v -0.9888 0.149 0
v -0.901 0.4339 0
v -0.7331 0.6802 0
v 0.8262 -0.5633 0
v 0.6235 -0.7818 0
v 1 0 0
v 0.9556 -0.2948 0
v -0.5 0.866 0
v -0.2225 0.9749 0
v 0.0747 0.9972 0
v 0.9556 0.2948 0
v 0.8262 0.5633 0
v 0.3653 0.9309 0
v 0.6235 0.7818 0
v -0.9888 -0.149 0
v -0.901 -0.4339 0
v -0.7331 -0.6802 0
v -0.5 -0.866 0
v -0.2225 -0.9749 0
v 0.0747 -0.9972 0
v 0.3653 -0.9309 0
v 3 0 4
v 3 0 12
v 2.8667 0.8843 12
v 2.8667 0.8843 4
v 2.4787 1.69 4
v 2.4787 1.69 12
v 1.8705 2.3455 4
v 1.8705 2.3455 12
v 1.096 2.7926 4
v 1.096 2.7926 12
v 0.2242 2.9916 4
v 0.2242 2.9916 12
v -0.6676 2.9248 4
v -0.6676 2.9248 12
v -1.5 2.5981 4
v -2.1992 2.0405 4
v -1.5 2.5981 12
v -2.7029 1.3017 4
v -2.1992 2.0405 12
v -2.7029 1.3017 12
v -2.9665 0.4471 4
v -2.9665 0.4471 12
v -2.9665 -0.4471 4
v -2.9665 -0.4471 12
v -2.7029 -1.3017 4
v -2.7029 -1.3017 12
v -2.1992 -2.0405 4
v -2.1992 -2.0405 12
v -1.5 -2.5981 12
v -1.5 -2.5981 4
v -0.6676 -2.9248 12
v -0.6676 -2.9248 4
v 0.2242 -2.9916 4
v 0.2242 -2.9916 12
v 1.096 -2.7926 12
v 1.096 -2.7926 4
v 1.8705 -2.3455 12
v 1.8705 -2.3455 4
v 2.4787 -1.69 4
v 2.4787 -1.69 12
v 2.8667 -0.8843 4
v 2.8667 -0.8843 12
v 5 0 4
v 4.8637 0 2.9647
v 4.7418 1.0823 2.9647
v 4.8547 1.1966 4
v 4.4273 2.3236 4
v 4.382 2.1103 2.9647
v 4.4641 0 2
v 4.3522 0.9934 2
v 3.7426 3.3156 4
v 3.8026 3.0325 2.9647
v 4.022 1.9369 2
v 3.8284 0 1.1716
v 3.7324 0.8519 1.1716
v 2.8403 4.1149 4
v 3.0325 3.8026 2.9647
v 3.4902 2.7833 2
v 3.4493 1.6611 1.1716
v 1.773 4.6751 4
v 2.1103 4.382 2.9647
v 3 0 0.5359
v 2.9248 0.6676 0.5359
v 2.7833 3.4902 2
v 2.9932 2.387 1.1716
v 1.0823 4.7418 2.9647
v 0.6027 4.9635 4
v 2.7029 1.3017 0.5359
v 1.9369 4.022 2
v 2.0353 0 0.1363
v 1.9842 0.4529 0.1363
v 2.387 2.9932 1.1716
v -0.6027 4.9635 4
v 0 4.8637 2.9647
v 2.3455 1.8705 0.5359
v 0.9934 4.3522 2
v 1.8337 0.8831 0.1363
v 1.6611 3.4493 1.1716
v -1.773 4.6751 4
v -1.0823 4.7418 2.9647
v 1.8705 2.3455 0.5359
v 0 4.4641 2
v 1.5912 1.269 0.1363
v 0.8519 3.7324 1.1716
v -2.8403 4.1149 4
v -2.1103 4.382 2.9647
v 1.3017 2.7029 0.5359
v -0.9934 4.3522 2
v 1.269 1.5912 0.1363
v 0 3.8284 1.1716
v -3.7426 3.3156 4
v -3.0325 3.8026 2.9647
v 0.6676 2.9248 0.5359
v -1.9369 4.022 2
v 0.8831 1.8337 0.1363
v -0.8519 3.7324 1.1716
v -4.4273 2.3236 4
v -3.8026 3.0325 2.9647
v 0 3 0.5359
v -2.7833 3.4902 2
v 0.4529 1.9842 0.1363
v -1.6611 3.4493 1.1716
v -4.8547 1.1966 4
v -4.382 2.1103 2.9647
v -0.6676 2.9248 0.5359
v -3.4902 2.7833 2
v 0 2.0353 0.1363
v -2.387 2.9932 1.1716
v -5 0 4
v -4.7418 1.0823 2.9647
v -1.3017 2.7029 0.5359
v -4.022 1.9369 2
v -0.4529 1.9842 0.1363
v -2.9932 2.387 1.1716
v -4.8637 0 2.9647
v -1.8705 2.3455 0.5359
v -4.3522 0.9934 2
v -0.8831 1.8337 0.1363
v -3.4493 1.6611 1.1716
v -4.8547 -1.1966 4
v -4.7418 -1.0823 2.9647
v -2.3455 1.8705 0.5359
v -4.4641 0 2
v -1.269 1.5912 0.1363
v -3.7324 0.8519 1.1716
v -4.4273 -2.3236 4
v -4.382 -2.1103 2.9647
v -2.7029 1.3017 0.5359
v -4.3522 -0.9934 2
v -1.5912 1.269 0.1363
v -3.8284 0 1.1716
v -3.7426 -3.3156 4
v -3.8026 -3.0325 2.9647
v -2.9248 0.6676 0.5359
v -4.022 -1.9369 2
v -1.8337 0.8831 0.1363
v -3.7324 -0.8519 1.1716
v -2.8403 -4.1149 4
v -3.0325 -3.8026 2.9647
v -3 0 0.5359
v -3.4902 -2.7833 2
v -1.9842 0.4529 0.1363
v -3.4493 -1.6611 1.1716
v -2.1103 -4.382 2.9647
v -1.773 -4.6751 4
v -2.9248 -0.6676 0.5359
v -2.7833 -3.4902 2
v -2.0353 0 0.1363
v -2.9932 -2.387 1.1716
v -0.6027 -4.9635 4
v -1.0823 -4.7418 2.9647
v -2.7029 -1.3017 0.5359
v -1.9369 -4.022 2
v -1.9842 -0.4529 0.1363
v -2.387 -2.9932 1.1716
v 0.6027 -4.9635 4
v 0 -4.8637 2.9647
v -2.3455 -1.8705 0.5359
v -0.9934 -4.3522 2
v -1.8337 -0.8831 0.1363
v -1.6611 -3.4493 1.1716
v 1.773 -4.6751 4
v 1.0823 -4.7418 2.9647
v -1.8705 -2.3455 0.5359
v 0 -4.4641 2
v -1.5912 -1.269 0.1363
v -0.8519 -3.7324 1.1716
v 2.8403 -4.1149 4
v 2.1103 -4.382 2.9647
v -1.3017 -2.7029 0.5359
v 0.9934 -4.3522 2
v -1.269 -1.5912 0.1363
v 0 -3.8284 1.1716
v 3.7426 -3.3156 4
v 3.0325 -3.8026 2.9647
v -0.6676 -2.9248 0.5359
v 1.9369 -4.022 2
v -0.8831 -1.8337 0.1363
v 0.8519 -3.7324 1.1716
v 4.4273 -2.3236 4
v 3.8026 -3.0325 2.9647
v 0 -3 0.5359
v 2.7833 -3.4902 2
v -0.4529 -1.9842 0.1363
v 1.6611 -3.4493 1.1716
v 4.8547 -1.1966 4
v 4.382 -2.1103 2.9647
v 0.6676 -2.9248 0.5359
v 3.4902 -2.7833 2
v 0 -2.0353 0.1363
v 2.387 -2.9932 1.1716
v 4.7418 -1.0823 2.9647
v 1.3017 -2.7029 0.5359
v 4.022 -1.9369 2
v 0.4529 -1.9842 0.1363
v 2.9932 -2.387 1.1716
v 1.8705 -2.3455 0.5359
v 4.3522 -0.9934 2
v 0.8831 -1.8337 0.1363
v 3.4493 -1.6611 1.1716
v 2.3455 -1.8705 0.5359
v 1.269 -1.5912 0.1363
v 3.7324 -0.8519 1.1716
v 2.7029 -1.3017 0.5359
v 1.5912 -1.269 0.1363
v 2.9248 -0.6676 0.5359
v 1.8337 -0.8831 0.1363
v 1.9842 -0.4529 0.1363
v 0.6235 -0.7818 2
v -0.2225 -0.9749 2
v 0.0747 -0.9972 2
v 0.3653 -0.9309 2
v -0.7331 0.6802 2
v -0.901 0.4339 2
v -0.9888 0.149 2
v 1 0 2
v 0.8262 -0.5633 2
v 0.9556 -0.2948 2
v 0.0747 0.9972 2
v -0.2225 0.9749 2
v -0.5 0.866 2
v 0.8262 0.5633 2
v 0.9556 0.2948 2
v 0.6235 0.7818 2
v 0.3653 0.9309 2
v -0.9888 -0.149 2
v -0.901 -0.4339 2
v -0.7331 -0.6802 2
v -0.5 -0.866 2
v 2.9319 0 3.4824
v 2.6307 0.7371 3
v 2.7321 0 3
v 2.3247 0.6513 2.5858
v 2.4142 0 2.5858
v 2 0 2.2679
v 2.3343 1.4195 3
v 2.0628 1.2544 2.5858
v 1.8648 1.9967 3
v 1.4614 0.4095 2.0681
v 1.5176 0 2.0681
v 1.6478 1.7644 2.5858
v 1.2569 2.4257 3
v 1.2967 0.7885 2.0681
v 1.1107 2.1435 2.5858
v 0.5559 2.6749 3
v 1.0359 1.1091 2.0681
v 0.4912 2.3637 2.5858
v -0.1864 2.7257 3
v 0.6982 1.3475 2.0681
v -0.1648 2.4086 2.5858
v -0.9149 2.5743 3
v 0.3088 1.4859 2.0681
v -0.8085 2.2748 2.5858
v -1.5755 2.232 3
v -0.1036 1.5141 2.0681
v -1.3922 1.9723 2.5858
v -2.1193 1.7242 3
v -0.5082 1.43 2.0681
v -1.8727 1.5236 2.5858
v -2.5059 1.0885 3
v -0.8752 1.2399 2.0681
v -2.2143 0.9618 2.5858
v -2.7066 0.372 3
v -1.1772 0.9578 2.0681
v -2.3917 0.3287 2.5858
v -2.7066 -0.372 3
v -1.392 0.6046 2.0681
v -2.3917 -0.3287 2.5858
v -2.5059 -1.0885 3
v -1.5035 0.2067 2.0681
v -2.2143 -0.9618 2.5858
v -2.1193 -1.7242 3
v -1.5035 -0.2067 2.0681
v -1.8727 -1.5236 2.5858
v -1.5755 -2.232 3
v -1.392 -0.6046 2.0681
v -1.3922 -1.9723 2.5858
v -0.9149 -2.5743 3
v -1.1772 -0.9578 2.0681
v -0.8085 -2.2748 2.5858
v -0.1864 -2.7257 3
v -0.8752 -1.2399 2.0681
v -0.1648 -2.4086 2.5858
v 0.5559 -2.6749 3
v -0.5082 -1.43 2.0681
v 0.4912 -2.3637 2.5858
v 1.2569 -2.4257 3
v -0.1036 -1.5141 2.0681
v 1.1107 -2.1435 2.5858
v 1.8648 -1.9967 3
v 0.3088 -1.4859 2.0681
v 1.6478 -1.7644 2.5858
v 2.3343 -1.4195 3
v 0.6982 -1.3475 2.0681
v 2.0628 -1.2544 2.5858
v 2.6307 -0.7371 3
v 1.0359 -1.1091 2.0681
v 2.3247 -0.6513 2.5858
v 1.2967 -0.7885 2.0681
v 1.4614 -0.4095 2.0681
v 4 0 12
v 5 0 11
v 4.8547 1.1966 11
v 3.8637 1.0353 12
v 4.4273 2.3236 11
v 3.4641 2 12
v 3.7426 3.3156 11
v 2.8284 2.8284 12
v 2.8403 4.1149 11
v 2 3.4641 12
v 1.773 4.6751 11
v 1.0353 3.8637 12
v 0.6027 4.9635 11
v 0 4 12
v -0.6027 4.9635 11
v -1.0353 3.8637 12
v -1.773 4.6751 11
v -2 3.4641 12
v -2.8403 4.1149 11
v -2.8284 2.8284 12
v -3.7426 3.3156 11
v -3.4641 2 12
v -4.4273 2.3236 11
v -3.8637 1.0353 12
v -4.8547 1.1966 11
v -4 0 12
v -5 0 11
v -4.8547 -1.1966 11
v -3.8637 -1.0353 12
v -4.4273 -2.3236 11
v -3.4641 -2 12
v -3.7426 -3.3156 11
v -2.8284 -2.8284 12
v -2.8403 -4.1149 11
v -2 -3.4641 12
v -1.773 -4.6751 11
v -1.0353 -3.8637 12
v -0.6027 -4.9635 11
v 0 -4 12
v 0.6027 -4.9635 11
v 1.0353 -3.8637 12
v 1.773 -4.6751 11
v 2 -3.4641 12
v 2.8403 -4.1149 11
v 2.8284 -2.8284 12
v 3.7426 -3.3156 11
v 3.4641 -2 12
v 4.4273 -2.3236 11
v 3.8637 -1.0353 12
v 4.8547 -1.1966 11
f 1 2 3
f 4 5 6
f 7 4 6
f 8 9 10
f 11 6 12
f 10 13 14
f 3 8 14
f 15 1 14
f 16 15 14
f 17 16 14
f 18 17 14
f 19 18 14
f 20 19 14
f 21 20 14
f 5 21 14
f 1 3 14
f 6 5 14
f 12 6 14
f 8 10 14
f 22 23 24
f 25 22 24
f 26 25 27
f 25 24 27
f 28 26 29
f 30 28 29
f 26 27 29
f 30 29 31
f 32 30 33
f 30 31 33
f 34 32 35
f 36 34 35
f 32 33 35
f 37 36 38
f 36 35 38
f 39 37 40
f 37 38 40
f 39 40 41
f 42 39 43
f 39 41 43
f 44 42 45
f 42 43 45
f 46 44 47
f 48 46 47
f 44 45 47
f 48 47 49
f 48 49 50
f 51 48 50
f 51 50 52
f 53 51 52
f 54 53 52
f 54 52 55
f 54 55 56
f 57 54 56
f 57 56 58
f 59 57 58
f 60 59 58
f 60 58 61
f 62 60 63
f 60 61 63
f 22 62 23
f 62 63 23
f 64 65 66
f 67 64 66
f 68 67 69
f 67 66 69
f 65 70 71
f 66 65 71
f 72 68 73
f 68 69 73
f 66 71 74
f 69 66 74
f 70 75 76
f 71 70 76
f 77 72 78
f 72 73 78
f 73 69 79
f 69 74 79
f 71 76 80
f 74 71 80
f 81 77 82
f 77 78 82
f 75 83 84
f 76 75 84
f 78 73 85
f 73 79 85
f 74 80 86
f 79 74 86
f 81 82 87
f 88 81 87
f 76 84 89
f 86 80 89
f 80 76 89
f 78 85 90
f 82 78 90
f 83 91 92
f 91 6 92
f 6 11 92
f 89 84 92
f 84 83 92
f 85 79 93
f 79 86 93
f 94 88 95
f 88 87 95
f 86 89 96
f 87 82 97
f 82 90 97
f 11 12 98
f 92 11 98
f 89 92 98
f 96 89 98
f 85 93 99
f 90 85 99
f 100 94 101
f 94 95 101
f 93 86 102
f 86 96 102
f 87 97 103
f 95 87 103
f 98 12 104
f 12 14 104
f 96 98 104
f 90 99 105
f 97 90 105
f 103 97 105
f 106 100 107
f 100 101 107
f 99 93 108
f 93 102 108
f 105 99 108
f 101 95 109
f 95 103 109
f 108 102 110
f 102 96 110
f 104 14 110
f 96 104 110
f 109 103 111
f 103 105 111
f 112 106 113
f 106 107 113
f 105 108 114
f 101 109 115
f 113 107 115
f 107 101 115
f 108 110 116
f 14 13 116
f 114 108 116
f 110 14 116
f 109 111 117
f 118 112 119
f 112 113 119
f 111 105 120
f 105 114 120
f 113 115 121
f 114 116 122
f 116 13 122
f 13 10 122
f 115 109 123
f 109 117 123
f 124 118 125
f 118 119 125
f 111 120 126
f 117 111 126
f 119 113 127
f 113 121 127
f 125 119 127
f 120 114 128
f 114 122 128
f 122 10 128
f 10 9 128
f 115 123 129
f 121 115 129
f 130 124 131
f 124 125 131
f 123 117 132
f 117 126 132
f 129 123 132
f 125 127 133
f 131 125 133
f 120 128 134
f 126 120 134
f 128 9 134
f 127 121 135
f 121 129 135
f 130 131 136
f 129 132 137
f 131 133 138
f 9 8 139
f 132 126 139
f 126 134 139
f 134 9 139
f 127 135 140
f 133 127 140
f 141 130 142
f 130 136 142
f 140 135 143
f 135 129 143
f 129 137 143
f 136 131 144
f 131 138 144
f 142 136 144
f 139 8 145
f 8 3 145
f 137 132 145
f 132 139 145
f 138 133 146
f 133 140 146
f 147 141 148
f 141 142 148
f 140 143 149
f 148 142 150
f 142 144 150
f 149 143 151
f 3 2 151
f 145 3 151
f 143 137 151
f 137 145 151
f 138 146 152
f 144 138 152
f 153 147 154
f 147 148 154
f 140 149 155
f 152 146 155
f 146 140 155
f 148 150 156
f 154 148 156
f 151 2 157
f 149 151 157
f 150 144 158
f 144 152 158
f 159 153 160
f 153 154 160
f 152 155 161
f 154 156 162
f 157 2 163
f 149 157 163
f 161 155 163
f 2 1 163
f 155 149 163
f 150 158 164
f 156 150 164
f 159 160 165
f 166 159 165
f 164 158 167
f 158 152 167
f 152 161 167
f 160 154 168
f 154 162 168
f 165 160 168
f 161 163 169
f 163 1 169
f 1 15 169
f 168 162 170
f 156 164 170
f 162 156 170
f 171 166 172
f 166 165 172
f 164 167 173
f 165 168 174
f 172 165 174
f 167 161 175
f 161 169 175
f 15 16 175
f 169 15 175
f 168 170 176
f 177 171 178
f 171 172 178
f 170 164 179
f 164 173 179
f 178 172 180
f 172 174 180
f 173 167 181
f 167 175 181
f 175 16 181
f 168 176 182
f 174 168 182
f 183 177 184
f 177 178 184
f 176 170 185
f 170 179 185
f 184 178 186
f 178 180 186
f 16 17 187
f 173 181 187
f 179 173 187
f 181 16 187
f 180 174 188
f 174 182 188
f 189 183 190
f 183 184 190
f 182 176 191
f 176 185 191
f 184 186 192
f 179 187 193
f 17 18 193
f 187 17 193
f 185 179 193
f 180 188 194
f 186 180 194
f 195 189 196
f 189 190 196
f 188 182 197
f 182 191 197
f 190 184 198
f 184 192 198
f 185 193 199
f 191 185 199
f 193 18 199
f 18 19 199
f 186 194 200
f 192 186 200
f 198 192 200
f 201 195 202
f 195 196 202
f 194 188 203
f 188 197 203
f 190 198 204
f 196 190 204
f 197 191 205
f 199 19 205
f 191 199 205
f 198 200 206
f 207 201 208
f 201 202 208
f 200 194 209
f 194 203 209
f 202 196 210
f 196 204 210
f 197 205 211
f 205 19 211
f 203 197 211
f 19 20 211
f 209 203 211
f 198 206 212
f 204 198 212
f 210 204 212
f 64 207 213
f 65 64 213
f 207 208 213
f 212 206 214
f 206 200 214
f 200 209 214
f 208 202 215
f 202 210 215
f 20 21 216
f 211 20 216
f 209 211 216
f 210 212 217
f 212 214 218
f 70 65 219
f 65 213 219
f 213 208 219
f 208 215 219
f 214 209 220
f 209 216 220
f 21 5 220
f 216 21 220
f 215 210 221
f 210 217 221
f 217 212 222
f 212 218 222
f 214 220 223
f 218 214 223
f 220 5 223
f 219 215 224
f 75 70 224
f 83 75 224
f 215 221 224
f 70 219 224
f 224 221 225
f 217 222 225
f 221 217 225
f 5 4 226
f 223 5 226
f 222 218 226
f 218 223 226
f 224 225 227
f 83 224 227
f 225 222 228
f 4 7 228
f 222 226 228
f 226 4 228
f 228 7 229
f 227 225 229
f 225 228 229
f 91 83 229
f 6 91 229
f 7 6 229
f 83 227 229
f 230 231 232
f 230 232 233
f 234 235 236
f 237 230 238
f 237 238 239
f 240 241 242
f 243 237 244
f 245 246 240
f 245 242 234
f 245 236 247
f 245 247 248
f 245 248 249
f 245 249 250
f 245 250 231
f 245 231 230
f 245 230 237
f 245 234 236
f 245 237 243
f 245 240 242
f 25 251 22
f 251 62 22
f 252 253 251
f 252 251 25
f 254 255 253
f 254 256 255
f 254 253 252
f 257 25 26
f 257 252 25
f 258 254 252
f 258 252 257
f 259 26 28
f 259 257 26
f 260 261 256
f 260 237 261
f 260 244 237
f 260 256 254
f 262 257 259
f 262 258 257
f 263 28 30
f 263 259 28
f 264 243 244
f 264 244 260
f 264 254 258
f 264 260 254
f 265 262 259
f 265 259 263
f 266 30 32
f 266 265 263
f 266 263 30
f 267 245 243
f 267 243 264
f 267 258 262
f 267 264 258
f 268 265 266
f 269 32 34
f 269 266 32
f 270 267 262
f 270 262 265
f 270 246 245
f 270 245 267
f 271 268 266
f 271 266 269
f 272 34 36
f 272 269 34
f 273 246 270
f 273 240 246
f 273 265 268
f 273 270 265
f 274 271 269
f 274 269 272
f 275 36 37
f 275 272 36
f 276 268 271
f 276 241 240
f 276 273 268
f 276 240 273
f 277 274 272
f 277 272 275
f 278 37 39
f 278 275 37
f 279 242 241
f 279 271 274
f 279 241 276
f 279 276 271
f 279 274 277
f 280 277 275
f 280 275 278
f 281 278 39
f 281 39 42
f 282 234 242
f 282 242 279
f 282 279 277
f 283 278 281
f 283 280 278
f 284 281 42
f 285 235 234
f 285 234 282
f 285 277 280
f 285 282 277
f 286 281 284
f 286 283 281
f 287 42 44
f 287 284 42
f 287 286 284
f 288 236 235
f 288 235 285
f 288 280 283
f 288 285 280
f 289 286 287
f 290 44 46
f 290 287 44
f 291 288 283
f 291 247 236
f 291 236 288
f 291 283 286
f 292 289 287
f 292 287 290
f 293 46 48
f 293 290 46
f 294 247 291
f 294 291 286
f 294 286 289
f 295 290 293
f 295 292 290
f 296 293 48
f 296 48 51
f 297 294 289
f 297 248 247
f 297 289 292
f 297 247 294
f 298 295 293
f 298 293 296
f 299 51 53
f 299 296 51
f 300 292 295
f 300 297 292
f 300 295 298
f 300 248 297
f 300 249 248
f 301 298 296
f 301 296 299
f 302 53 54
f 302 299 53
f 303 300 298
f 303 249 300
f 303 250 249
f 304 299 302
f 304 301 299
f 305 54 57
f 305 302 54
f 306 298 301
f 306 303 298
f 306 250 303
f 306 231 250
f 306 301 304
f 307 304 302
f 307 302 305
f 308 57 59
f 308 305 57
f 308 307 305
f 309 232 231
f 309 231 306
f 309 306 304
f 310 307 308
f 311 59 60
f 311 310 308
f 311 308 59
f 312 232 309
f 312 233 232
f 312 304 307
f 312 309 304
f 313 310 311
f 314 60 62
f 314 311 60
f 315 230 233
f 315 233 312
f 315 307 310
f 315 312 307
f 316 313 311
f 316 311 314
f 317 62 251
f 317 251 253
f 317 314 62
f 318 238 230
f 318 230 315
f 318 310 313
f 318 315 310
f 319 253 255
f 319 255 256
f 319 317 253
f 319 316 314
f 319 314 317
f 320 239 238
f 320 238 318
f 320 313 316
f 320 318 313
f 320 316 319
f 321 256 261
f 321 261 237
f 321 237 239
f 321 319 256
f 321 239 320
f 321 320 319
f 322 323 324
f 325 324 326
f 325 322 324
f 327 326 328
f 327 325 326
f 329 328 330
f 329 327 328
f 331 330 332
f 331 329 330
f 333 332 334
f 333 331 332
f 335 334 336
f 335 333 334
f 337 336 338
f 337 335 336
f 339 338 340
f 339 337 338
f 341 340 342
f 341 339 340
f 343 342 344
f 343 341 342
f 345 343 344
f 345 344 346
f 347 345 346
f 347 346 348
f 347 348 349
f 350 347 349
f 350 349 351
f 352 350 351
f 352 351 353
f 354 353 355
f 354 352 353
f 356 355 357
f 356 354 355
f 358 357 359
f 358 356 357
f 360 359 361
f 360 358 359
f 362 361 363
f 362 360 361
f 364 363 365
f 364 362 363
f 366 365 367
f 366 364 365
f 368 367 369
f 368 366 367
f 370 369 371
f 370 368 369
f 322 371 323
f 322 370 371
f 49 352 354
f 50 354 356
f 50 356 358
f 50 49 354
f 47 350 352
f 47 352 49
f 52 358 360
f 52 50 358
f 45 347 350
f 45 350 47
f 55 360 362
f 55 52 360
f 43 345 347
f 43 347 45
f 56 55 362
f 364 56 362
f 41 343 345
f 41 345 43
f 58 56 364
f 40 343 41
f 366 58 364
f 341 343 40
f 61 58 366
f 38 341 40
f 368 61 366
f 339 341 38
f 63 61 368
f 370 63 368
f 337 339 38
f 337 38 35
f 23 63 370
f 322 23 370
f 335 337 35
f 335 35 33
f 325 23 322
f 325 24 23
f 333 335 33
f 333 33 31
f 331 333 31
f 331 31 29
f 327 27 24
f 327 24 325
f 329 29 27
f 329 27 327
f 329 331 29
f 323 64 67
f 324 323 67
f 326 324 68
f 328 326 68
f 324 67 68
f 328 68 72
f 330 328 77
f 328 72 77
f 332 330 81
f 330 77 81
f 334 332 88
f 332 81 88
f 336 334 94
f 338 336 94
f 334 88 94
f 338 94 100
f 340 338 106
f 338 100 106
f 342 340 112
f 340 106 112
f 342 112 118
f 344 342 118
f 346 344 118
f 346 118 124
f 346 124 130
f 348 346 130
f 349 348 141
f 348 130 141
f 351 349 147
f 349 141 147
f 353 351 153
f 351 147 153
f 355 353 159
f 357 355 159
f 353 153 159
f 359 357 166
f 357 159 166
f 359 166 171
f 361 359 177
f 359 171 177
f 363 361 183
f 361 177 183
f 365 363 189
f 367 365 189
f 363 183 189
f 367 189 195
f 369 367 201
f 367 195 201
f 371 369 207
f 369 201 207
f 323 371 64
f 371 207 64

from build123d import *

# Parameters (mm, degrees)
SKETCH_R     = 5
PAD_DEPTH    = 12
SKETCH001_R  = 3
POCKET_DEPTH = 10
FILLET_R     = 4
CHAMFER_SIZE = 1
FILLET001_R  = 2


with BuildPart() as part:
    # Sketch → Pad (new body)
    with BuildSketch(Plane.XY):
        Circle(SKETCH_R)
    extrude(amount=PAD_DEPTH)

    # Sketch001 (on Face3 of Pad) → Pocket (cut)
    with BuildSketch(Plane.XY.offset(12)):
        Circle(SKETCH001_R)
    extrude(amount=-POCKET_DEPTH, mode=Mode.SUBTRACT)

    # Fillet
    fillet_edges = [part.edges().sort_by_distance(p)[0] for p in [
        (-5, 0, 0),
    ]]
    fillet(fillet_edges, radius=FILLET_R)

    # Chamfer
    chamfer_edges = [part.edges().sort_by_distance(p)[0] for p in [
        (-5, 0, 12),
    ]]
    chamfer(chamfer_edges, length=CHAMFER_SIZE)

    # Fillet001
    fillet001_edges = [part.edges().sort_by_distance(p)[0] for p in [
        (-3, 0, 2),
    ]]
    fillet(fillet001_edges, radius=FILLET001_R)


solid = part.part
